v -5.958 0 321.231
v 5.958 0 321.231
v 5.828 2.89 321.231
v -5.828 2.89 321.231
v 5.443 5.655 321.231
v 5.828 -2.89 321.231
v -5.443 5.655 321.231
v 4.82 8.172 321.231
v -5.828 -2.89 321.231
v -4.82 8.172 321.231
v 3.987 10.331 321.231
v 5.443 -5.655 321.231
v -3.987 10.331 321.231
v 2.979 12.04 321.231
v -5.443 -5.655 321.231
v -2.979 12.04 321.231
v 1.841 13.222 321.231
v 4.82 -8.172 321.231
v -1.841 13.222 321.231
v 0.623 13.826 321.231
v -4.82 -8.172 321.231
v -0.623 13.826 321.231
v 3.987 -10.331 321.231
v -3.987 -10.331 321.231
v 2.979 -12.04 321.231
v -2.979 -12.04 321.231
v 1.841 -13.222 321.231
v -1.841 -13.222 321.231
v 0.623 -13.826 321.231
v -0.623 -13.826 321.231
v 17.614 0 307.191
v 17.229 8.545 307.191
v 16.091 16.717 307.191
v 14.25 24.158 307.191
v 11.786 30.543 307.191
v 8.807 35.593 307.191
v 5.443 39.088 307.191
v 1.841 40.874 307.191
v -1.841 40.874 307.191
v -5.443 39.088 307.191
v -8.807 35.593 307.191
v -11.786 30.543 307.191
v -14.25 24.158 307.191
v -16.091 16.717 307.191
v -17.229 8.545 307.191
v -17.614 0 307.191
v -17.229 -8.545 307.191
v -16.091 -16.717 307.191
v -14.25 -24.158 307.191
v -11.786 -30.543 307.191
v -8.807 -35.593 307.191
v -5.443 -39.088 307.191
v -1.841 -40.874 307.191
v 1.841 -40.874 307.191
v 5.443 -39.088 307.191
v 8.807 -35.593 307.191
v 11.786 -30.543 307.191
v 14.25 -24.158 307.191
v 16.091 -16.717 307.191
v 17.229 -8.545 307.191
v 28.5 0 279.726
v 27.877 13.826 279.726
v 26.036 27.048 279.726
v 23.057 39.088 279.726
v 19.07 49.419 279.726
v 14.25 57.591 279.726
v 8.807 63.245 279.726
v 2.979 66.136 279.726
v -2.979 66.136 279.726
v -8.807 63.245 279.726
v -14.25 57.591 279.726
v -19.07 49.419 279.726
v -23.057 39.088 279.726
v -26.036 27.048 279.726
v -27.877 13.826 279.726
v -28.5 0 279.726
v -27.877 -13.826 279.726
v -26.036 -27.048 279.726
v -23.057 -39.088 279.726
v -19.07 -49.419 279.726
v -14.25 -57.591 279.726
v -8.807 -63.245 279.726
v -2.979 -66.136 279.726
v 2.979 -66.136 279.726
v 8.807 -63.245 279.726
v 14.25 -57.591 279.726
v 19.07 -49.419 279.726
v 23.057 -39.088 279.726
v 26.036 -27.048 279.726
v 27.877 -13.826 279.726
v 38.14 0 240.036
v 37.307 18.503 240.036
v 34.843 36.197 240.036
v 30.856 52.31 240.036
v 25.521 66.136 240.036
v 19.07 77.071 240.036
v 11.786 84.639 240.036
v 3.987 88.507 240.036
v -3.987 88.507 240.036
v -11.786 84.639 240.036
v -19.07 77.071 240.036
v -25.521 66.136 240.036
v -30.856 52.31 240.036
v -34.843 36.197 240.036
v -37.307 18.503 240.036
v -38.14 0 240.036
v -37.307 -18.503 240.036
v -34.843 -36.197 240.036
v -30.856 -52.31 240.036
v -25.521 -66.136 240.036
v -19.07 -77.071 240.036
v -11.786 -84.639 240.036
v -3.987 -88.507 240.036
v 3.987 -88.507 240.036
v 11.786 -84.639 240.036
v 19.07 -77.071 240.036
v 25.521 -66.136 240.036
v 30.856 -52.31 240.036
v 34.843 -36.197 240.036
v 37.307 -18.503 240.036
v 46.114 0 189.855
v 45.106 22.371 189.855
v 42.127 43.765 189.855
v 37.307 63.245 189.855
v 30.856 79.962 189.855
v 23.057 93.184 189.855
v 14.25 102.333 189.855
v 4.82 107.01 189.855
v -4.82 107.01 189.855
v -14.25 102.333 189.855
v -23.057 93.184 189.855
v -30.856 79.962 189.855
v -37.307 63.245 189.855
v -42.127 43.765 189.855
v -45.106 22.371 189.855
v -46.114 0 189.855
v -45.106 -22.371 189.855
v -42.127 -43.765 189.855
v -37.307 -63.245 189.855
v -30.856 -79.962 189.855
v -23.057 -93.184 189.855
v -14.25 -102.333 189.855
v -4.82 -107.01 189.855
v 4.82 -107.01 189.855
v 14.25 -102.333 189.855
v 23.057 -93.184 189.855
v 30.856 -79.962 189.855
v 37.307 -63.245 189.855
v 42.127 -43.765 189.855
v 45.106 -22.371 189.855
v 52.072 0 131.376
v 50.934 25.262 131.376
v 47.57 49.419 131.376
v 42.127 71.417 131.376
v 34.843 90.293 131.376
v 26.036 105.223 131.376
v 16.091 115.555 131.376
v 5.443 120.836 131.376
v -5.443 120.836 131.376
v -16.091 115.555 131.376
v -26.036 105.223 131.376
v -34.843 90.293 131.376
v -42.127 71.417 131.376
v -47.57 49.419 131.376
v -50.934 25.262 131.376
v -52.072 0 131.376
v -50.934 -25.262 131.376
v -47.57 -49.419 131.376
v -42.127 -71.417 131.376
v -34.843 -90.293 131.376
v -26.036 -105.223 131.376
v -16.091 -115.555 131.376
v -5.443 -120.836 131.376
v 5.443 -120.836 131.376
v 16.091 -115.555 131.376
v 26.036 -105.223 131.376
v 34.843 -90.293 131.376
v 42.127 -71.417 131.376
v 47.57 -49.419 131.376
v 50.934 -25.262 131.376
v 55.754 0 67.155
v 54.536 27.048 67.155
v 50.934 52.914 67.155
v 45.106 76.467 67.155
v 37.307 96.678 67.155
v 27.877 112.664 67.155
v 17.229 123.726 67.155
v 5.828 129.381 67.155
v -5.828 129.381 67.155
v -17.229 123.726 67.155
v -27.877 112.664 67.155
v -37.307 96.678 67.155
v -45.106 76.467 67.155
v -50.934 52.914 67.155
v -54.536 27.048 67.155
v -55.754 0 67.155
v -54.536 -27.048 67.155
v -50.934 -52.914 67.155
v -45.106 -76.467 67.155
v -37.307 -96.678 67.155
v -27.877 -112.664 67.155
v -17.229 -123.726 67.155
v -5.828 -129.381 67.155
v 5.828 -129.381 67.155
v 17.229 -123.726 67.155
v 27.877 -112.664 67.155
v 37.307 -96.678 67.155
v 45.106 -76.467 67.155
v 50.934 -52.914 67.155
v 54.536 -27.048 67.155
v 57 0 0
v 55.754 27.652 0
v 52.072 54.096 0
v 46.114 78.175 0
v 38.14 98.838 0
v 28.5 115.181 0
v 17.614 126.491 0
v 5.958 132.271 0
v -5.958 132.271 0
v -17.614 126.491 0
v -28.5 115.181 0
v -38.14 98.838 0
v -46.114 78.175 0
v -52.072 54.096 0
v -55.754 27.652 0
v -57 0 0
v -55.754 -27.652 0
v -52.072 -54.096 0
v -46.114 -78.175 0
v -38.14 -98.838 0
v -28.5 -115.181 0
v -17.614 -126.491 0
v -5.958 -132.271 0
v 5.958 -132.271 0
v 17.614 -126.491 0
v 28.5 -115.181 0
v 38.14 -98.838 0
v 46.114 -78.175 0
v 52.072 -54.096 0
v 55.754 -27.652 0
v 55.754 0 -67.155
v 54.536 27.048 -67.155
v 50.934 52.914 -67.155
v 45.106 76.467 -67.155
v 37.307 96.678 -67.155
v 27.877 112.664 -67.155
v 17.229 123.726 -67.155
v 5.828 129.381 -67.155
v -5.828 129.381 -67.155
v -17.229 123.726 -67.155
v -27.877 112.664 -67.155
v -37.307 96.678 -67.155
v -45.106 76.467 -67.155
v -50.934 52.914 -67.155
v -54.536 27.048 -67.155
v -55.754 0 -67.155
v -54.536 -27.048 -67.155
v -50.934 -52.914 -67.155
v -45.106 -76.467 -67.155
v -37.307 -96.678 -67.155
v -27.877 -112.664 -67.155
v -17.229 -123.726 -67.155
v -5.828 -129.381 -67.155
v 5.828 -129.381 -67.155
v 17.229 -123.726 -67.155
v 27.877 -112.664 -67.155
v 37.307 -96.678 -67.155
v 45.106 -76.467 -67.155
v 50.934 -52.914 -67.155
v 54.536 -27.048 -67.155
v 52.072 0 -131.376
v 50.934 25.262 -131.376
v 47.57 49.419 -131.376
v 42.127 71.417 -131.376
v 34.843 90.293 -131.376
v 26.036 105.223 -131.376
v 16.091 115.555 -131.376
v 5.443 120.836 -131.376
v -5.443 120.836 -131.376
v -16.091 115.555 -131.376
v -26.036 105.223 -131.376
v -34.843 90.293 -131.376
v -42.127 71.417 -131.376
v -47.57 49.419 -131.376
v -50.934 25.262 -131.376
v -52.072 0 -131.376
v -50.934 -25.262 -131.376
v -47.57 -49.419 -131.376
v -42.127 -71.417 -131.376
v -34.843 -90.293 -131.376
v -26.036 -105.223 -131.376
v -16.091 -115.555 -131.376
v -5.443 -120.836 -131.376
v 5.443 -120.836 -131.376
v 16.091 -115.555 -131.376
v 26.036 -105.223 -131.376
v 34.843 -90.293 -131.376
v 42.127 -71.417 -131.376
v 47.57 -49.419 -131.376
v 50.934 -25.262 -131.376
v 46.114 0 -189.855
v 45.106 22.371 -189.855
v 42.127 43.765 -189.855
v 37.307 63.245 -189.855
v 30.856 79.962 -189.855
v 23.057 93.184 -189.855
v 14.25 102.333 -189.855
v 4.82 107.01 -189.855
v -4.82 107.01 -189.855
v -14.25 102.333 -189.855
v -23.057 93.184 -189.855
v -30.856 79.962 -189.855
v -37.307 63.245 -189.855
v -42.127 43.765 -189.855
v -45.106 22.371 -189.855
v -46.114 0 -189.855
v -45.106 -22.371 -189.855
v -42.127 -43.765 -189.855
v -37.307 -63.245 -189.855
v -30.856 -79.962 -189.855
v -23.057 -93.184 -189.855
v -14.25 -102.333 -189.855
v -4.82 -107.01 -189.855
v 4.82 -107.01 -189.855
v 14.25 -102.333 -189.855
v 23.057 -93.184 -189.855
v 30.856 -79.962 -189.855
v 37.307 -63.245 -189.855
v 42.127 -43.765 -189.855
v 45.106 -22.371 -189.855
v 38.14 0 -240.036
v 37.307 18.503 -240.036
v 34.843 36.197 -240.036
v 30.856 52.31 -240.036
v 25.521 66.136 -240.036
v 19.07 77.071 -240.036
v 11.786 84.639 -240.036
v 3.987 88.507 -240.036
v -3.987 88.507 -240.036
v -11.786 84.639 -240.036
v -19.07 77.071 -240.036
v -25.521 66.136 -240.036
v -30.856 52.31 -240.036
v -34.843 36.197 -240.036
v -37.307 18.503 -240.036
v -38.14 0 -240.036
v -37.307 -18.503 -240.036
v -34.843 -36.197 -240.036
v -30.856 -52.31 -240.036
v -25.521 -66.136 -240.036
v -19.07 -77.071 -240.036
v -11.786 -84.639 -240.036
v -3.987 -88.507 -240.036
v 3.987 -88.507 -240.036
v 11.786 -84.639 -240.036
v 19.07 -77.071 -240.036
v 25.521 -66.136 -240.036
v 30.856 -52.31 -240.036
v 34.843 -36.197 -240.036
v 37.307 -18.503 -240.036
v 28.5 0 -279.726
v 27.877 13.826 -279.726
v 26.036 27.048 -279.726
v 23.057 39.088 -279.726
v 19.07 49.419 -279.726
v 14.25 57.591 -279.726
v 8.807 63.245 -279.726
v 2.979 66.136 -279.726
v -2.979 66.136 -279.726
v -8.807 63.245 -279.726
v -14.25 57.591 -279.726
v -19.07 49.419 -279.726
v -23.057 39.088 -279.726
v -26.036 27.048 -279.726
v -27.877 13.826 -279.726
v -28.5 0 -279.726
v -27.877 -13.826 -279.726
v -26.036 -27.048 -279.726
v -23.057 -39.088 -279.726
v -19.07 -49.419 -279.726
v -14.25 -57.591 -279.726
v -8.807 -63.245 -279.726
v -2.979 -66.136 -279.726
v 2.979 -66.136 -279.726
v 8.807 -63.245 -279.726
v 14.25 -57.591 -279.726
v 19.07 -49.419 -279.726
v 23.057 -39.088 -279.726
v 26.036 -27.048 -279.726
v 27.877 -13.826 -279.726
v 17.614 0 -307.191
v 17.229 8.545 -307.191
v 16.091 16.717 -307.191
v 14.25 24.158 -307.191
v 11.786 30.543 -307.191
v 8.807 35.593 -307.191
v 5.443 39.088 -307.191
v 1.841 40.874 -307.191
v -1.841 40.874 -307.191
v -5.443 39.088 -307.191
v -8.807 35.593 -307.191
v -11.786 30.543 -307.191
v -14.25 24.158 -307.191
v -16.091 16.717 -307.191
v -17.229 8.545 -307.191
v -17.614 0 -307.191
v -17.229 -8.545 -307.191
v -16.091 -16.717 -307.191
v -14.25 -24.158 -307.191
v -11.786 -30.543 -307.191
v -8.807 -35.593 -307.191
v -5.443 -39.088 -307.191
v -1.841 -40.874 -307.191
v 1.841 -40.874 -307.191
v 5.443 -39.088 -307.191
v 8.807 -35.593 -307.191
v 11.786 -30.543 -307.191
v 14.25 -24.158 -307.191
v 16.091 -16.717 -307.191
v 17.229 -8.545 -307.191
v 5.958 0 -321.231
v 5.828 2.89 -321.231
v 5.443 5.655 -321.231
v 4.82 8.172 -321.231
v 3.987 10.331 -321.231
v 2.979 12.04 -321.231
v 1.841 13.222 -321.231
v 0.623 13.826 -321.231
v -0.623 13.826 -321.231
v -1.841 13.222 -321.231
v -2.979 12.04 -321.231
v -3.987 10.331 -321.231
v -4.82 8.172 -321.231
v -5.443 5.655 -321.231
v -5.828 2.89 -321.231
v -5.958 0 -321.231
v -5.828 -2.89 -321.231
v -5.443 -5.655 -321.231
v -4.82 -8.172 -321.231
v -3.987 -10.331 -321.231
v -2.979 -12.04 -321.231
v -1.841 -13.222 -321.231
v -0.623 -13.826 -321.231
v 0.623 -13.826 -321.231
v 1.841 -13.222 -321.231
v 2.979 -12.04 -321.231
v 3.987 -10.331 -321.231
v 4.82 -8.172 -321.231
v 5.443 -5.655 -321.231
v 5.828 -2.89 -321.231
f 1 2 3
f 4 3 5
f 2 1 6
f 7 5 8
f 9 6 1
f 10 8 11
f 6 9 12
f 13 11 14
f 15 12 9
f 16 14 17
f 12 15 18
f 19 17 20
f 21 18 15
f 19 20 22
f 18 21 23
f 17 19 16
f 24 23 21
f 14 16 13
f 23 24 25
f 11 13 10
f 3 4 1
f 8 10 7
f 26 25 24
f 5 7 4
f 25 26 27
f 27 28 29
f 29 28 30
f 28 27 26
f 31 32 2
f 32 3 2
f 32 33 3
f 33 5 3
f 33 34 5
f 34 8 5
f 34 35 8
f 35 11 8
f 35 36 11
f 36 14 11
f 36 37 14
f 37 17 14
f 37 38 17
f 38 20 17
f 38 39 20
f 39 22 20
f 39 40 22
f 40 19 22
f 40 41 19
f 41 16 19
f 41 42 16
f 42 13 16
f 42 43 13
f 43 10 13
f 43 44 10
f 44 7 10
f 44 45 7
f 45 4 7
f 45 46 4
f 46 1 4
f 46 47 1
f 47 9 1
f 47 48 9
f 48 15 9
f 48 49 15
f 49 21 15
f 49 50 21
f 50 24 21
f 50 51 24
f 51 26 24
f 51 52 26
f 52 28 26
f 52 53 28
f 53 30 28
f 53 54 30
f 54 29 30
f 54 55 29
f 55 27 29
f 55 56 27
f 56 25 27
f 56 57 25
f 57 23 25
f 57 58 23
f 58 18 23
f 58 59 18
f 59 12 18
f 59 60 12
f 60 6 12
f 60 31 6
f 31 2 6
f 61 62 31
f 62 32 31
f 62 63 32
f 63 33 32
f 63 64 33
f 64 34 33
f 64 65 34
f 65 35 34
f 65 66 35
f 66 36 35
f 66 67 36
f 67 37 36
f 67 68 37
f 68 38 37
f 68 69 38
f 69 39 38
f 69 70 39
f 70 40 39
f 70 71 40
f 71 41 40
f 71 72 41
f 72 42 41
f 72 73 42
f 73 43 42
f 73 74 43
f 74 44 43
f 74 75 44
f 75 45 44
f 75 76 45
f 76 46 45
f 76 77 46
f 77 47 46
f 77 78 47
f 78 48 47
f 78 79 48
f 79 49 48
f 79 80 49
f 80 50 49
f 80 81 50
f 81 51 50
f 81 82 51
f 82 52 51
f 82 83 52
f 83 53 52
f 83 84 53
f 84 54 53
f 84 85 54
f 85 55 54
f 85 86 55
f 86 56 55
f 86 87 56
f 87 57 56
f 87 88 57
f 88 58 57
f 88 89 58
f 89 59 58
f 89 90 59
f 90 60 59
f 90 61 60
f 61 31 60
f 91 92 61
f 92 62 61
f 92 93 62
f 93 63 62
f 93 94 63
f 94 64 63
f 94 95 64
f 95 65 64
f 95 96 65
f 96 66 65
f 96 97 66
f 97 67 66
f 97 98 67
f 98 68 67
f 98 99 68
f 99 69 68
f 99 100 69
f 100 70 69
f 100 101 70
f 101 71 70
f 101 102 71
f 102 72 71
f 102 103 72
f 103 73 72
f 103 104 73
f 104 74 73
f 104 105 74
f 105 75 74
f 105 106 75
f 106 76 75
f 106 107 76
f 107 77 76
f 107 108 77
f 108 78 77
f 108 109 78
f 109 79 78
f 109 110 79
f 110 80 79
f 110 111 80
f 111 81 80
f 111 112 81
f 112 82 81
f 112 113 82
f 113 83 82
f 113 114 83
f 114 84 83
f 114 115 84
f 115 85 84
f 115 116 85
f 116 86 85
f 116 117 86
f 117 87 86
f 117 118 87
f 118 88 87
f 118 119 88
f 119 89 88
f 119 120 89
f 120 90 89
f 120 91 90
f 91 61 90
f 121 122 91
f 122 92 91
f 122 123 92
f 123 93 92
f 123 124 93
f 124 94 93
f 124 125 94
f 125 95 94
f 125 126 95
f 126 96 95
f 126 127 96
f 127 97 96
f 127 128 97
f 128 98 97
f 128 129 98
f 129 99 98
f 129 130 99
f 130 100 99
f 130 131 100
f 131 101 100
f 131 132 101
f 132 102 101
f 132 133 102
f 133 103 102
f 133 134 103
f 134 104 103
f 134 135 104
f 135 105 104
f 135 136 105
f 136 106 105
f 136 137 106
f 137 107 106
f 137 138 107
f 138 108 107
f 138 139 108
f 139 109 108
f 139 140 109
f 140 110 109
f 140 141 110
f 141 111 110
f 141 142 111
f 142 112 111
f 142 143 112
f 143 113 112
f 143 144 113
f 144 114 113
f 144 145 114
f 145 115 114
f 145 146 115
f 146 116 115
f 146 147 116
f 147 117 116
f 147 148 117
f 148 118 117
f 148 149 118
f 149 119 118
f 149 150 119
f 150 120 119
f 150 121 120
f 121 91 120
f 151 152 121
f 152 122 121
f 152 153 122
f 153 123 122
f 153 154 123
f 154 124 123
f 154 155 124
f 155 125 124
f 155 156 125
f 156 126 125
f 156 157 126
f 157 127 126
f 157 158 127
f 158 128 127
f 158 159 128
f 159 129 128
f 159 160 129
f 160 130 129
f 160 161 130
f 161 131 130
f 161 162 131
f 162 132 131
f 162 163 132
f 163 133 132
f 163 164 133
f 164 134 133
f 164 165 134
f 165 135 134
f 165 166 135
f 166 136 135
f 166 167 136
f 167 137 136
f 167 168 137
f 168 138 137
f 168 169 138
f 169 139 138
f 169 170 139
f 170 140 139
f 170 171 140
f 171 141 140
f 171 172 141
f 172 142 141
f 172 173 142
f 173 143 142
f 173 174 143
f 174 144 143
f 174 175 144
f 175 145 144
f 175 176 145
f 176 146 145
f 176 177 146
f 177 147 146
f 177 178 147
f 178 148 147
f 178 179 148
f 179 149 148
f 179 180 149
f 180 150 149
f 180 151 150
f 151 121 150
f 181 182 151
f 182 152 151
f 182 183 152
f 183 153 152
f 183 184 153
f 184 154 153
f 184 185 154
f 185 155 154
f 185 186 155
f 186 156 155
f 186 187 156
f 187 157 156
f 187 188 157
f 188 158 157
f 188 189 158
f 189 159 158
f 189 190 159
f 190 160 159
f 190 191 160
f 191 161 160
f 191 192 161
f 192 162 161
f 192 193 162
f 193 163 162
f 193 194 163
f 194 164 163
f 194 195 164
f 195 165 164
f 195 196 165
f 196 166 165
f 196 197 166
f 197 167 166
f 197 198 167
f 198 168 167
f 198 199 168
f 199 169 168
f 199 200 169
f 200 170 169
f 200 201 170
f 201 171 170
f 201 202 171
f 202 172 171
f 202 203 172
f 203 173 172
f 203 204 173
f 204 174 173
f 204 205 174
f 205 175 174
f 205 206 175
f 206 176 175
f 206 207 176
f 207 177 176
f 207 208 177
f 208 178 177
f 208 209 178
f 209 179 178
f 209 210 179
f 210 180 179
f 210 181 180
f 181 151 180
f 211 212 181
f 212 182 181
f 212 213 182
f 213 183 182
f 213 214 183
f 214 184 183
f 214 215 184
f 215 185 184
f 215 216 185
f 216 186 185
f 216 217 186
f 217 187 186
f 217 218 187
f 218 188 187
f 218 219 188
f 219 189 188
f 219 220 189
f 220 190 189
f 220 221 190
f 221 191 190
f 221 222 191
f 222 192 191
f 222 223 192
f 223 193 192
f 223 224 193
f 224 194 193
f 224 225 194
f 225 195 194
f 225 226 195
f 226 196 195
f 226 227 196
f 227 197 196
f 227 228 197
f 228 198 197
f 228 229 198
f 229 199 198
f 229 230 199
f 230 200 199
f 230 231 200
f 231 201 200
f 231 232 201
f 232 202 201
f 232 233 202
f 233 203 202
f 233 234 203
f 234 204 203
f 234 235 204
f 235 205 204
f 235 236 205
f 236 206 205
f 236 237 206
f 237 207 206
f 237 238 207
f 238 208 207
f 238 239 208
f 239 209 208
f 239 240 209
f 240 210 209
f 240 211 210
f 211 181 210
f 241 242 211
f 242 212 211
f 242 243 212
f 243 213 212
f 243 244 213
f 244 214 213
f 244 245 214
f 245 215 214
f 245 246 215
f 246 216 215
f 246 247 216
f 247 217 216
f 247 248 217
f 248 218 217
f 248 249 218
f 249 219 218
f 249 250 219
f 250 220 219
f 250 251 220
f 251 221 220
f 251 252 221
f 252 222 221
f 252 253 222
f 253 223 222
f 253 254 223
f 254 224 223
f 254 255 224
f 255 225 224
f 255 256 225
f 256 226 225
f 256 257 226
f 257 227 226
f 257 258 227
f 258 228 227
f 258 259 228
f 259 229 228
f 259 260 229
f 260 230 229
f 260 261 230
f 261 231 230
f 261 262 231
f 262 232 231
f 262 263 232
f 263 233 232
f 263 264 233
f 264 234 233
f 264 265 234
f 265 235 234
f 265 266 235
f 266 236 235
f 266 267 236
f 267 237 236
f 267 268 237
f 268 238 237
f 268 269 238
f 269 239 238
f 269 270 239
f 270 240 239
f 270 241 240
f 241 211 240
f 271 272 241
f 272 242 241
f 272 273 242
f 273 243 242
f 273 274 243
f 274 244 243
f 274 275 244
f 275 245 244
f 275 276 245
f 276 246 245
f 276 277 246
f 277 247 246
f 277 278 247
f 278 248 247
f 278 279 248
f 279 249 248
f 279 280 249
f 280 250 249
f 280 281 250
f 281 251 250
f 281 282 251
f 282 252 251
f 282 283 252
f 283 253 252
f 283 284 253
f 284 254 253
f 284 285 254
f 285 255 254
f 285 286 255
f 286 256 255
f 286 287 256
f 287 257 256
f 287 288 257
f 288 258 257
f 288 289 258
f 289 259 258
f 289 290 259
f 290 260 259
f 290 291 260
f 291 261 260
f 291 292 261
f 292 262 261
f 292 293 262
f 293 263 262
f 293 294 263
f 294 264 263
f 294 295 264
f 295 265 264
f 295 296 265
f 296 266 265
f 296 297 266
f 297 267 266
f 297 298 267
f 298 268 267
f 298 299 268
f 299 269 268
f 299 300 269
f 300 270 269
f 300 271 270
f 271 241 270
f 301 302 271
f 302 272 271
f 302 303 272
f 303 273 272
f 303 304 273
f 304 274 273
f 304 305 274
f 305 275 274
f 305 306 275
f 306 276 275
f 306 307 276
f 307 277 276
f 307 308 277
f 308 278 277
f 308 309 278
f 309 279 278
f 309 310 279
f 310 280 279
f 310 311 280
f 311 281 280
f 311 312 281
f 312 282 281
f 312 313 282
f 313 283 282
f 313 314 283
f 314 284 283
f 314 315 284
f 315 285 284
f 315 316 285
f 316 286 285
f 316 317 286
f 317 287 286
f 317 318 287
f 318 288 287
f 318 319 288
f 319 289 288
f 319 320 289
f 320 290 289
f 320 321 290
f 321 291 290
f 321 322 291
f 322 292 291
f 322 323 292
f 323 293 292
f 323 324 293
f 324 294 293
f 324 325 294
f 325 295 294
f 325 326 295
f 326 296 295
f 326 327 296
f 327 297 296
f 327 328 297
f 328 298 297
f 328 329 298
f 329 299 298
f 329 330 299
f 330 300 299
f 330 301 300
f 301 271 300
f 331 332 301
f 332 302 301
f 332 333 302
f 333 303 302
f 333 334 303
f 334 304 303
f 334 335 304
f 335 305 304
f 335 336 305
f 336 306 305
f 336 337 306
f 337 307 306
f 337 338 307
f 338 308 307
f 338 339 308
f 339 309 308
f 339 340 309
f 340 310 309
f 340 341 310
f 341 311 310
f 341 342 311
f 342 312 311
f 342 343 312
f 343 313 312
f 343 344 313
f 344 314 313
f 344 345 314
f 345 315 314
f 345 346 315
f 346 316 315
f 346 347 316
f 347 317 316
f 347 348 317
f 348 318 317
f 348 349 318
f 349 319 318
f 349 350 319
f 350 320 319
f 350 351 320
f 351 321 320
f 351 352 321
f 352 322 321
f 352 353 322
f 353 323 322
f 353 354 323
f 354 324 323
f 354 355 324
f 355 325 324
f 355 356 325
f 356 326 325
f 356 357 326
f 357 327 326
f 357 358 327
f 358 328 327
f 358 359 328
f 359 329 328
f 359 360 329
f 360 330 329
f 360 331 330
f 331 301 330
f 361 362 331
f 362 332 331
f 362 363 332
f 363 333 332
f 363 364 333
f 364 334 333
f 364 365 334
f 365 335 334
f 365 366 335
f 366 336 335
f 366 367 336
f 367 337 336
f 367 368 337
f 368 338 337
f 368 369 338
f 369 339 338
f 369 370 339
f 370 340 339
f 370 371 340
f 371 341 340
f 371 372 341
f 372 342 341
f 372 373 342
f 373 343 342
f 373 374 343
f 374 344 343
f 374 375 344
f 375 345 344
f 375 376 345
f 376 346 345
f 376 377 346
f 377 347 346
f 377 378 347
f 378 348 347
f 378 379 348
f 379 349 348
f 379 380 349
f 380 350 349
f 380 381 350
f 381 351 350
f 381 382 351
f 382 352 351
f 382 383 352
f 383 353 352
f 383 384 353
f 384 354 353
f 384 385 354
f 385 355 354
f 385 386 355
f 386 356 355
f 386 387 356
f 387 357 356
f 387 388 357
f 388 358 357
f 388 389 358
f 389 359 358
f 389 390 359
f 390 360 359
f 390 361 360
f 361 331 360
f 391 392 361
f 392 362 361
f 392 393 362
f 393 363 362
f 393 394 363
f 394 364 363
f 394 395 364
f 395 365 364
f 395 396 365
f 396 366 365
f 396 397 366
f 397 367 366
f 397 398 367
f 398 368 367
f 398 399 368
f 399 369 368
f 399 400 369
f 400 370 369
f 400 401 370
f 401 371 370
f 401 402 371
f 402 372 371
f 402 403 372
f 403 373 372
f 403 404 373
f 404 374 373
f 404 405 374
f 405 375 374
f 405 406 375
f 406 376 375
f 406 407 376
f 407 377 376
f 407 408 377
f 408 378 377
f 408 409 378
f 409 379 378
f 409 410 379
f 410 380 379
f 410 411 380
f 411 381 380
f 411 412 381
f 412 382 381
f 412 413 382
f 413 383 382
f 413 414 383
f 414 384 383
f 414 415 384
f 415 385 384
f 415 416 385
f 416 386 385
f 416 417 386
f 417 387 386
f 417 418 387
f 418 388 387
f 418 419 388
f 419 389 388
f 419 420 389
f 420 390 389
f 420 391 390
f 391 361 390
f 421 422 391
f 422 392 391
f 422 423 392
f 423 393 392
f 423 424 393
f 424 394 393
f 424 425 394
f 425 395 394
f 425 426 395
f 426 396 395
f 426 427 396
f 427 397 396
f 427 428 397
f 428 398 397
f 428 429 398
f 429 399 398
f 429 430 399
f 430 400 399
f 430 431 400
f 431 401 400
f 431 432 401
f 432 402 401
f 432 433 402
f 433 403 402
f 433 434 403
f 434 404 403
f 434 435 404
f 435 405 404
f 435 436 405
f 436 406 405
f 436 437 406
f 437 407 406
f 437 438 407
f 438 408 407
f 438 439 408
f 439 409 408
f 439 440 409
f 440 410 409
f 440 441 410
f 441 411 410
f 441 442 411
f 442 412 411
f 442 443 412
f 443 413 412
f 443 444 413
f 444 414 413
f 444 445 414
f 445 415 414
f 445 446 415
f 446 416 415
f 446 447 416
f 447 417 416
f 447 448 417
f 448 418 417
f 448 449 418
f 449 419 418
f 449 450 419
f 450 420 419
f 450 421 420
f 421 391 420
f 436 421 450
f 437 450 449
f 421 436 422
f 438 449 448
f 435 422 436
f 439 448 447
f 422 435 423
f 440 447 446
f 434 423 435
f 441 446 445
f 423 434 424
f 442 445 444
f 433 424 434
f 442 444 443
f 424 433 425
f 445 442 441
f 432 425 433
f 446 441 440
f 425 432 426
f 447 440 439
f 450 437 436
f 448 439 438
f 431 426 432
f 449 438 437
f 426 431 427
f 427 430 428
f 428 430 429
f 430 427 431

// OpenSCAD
// Generated by SolidPython 1.0.1 on 2020-07-29 00:39:25


scale(v = [3, 7, 17]) {
	sphere(r = 19);
}
/***********************************************
*********      SolidPython code:      **********
************************************************
 
# import packages: SolidPython
from solid import *
from solid.utils import *
from itertools import chain, combinations


class Resize:

    def __init__(self, scad_file):
        self.scad_file = scad_file
        #self.scad_file = import_scad(scad_file)
        # cone/cylinder param:
        self.r1 = 0
        self.r2 = 0
        self.h = 0
        # rectangular prism param:
        self.w = 0
        self.l = 0
        # ellipse param:
        self.r = 0

    # import OpenScad code (file name corresponds to shape)


    # classify shape + parameters
    def assign(self, param1, param2, param3):
        if self.scad_file == 'cone.scad':
            self.r1 = param1
            self.r2 = param2
            self.h = param3
        elif self.scad_file == 'cylinder.scad':
            self.r1 = param1
            self.r2 = param2
            self.h = param3
        elif self.scad_file == 'rectangularPrism.scad':
            self.h = param1
            self.l = param2
            self.w = param3
        else:
            self.r = param1
            self.h = param2

    # resize parameters
    def iterate(self):
        x = range(3, 20, 2)
        i = 1
        if self.scad_file == 'cone.scad':
            tempList = list(combinations(x, 2))
            for temp in tempList:
                param1 = temp[0]
                param2 = temp[1]
                filepath = 'produced_scad_files/' + 'cone' + str(param1) + '_' + str(param2) + '_' + '.scad'
                scad_render_to_file(cylinder(h=param1, r1=param2, r2=0), filepath)

        elif self.scad_file == 'cylinder.scad':
            tempList = list(combinations(x, 3))
            for temp in tempList:
                param1 = temp[0]
                param2 = temp[1]
                filepath = 'produced_scad_files/' + 'cylinder' + str(param1) + '_' + str(param2) + '_' + '.scad'
                scad_render_to_file(cylinder(h=param1, r1=param2, r2=param2), filepath)

        elif self.scad_file == 'rectangularPrism.scad':
            tempList = list(combinations(x, 3))
            for temp in tempList:
                param1 = temp[0]
                param2 = temp[1]
                param3 = temp[2]
                filepath = 'produced_scad_files/' + 'rectangularPrism' + str(param1) + '_' + str(param2) + '_' + str(
                    param3) + '.scad'
                scad_render_to_file(cube(size=(param1, param2, param3)), filepath)

        elif self.scad_file == 'ellipse.scad':
            tempList = list(combinations(x, 4))
            for temp in tempList:
                param1 = temp[0]
                param2 = temp[1]
                param3 = temp[2]
                param4 = temp[3]
                filepath = 'produced_scad_files/' + 'ellipse' + str(param1) + '_' + str(param2) + '_' + str(param3) + '_' + str(param4) + '.scad'
                scad_render_to_file(scale([param1, param2, param3])(sphere(r=param4)), filepath)

    def render_to_scadfile(self):
        scad_render_to_file(scad, 'example.scad') 
 
************************************************/
